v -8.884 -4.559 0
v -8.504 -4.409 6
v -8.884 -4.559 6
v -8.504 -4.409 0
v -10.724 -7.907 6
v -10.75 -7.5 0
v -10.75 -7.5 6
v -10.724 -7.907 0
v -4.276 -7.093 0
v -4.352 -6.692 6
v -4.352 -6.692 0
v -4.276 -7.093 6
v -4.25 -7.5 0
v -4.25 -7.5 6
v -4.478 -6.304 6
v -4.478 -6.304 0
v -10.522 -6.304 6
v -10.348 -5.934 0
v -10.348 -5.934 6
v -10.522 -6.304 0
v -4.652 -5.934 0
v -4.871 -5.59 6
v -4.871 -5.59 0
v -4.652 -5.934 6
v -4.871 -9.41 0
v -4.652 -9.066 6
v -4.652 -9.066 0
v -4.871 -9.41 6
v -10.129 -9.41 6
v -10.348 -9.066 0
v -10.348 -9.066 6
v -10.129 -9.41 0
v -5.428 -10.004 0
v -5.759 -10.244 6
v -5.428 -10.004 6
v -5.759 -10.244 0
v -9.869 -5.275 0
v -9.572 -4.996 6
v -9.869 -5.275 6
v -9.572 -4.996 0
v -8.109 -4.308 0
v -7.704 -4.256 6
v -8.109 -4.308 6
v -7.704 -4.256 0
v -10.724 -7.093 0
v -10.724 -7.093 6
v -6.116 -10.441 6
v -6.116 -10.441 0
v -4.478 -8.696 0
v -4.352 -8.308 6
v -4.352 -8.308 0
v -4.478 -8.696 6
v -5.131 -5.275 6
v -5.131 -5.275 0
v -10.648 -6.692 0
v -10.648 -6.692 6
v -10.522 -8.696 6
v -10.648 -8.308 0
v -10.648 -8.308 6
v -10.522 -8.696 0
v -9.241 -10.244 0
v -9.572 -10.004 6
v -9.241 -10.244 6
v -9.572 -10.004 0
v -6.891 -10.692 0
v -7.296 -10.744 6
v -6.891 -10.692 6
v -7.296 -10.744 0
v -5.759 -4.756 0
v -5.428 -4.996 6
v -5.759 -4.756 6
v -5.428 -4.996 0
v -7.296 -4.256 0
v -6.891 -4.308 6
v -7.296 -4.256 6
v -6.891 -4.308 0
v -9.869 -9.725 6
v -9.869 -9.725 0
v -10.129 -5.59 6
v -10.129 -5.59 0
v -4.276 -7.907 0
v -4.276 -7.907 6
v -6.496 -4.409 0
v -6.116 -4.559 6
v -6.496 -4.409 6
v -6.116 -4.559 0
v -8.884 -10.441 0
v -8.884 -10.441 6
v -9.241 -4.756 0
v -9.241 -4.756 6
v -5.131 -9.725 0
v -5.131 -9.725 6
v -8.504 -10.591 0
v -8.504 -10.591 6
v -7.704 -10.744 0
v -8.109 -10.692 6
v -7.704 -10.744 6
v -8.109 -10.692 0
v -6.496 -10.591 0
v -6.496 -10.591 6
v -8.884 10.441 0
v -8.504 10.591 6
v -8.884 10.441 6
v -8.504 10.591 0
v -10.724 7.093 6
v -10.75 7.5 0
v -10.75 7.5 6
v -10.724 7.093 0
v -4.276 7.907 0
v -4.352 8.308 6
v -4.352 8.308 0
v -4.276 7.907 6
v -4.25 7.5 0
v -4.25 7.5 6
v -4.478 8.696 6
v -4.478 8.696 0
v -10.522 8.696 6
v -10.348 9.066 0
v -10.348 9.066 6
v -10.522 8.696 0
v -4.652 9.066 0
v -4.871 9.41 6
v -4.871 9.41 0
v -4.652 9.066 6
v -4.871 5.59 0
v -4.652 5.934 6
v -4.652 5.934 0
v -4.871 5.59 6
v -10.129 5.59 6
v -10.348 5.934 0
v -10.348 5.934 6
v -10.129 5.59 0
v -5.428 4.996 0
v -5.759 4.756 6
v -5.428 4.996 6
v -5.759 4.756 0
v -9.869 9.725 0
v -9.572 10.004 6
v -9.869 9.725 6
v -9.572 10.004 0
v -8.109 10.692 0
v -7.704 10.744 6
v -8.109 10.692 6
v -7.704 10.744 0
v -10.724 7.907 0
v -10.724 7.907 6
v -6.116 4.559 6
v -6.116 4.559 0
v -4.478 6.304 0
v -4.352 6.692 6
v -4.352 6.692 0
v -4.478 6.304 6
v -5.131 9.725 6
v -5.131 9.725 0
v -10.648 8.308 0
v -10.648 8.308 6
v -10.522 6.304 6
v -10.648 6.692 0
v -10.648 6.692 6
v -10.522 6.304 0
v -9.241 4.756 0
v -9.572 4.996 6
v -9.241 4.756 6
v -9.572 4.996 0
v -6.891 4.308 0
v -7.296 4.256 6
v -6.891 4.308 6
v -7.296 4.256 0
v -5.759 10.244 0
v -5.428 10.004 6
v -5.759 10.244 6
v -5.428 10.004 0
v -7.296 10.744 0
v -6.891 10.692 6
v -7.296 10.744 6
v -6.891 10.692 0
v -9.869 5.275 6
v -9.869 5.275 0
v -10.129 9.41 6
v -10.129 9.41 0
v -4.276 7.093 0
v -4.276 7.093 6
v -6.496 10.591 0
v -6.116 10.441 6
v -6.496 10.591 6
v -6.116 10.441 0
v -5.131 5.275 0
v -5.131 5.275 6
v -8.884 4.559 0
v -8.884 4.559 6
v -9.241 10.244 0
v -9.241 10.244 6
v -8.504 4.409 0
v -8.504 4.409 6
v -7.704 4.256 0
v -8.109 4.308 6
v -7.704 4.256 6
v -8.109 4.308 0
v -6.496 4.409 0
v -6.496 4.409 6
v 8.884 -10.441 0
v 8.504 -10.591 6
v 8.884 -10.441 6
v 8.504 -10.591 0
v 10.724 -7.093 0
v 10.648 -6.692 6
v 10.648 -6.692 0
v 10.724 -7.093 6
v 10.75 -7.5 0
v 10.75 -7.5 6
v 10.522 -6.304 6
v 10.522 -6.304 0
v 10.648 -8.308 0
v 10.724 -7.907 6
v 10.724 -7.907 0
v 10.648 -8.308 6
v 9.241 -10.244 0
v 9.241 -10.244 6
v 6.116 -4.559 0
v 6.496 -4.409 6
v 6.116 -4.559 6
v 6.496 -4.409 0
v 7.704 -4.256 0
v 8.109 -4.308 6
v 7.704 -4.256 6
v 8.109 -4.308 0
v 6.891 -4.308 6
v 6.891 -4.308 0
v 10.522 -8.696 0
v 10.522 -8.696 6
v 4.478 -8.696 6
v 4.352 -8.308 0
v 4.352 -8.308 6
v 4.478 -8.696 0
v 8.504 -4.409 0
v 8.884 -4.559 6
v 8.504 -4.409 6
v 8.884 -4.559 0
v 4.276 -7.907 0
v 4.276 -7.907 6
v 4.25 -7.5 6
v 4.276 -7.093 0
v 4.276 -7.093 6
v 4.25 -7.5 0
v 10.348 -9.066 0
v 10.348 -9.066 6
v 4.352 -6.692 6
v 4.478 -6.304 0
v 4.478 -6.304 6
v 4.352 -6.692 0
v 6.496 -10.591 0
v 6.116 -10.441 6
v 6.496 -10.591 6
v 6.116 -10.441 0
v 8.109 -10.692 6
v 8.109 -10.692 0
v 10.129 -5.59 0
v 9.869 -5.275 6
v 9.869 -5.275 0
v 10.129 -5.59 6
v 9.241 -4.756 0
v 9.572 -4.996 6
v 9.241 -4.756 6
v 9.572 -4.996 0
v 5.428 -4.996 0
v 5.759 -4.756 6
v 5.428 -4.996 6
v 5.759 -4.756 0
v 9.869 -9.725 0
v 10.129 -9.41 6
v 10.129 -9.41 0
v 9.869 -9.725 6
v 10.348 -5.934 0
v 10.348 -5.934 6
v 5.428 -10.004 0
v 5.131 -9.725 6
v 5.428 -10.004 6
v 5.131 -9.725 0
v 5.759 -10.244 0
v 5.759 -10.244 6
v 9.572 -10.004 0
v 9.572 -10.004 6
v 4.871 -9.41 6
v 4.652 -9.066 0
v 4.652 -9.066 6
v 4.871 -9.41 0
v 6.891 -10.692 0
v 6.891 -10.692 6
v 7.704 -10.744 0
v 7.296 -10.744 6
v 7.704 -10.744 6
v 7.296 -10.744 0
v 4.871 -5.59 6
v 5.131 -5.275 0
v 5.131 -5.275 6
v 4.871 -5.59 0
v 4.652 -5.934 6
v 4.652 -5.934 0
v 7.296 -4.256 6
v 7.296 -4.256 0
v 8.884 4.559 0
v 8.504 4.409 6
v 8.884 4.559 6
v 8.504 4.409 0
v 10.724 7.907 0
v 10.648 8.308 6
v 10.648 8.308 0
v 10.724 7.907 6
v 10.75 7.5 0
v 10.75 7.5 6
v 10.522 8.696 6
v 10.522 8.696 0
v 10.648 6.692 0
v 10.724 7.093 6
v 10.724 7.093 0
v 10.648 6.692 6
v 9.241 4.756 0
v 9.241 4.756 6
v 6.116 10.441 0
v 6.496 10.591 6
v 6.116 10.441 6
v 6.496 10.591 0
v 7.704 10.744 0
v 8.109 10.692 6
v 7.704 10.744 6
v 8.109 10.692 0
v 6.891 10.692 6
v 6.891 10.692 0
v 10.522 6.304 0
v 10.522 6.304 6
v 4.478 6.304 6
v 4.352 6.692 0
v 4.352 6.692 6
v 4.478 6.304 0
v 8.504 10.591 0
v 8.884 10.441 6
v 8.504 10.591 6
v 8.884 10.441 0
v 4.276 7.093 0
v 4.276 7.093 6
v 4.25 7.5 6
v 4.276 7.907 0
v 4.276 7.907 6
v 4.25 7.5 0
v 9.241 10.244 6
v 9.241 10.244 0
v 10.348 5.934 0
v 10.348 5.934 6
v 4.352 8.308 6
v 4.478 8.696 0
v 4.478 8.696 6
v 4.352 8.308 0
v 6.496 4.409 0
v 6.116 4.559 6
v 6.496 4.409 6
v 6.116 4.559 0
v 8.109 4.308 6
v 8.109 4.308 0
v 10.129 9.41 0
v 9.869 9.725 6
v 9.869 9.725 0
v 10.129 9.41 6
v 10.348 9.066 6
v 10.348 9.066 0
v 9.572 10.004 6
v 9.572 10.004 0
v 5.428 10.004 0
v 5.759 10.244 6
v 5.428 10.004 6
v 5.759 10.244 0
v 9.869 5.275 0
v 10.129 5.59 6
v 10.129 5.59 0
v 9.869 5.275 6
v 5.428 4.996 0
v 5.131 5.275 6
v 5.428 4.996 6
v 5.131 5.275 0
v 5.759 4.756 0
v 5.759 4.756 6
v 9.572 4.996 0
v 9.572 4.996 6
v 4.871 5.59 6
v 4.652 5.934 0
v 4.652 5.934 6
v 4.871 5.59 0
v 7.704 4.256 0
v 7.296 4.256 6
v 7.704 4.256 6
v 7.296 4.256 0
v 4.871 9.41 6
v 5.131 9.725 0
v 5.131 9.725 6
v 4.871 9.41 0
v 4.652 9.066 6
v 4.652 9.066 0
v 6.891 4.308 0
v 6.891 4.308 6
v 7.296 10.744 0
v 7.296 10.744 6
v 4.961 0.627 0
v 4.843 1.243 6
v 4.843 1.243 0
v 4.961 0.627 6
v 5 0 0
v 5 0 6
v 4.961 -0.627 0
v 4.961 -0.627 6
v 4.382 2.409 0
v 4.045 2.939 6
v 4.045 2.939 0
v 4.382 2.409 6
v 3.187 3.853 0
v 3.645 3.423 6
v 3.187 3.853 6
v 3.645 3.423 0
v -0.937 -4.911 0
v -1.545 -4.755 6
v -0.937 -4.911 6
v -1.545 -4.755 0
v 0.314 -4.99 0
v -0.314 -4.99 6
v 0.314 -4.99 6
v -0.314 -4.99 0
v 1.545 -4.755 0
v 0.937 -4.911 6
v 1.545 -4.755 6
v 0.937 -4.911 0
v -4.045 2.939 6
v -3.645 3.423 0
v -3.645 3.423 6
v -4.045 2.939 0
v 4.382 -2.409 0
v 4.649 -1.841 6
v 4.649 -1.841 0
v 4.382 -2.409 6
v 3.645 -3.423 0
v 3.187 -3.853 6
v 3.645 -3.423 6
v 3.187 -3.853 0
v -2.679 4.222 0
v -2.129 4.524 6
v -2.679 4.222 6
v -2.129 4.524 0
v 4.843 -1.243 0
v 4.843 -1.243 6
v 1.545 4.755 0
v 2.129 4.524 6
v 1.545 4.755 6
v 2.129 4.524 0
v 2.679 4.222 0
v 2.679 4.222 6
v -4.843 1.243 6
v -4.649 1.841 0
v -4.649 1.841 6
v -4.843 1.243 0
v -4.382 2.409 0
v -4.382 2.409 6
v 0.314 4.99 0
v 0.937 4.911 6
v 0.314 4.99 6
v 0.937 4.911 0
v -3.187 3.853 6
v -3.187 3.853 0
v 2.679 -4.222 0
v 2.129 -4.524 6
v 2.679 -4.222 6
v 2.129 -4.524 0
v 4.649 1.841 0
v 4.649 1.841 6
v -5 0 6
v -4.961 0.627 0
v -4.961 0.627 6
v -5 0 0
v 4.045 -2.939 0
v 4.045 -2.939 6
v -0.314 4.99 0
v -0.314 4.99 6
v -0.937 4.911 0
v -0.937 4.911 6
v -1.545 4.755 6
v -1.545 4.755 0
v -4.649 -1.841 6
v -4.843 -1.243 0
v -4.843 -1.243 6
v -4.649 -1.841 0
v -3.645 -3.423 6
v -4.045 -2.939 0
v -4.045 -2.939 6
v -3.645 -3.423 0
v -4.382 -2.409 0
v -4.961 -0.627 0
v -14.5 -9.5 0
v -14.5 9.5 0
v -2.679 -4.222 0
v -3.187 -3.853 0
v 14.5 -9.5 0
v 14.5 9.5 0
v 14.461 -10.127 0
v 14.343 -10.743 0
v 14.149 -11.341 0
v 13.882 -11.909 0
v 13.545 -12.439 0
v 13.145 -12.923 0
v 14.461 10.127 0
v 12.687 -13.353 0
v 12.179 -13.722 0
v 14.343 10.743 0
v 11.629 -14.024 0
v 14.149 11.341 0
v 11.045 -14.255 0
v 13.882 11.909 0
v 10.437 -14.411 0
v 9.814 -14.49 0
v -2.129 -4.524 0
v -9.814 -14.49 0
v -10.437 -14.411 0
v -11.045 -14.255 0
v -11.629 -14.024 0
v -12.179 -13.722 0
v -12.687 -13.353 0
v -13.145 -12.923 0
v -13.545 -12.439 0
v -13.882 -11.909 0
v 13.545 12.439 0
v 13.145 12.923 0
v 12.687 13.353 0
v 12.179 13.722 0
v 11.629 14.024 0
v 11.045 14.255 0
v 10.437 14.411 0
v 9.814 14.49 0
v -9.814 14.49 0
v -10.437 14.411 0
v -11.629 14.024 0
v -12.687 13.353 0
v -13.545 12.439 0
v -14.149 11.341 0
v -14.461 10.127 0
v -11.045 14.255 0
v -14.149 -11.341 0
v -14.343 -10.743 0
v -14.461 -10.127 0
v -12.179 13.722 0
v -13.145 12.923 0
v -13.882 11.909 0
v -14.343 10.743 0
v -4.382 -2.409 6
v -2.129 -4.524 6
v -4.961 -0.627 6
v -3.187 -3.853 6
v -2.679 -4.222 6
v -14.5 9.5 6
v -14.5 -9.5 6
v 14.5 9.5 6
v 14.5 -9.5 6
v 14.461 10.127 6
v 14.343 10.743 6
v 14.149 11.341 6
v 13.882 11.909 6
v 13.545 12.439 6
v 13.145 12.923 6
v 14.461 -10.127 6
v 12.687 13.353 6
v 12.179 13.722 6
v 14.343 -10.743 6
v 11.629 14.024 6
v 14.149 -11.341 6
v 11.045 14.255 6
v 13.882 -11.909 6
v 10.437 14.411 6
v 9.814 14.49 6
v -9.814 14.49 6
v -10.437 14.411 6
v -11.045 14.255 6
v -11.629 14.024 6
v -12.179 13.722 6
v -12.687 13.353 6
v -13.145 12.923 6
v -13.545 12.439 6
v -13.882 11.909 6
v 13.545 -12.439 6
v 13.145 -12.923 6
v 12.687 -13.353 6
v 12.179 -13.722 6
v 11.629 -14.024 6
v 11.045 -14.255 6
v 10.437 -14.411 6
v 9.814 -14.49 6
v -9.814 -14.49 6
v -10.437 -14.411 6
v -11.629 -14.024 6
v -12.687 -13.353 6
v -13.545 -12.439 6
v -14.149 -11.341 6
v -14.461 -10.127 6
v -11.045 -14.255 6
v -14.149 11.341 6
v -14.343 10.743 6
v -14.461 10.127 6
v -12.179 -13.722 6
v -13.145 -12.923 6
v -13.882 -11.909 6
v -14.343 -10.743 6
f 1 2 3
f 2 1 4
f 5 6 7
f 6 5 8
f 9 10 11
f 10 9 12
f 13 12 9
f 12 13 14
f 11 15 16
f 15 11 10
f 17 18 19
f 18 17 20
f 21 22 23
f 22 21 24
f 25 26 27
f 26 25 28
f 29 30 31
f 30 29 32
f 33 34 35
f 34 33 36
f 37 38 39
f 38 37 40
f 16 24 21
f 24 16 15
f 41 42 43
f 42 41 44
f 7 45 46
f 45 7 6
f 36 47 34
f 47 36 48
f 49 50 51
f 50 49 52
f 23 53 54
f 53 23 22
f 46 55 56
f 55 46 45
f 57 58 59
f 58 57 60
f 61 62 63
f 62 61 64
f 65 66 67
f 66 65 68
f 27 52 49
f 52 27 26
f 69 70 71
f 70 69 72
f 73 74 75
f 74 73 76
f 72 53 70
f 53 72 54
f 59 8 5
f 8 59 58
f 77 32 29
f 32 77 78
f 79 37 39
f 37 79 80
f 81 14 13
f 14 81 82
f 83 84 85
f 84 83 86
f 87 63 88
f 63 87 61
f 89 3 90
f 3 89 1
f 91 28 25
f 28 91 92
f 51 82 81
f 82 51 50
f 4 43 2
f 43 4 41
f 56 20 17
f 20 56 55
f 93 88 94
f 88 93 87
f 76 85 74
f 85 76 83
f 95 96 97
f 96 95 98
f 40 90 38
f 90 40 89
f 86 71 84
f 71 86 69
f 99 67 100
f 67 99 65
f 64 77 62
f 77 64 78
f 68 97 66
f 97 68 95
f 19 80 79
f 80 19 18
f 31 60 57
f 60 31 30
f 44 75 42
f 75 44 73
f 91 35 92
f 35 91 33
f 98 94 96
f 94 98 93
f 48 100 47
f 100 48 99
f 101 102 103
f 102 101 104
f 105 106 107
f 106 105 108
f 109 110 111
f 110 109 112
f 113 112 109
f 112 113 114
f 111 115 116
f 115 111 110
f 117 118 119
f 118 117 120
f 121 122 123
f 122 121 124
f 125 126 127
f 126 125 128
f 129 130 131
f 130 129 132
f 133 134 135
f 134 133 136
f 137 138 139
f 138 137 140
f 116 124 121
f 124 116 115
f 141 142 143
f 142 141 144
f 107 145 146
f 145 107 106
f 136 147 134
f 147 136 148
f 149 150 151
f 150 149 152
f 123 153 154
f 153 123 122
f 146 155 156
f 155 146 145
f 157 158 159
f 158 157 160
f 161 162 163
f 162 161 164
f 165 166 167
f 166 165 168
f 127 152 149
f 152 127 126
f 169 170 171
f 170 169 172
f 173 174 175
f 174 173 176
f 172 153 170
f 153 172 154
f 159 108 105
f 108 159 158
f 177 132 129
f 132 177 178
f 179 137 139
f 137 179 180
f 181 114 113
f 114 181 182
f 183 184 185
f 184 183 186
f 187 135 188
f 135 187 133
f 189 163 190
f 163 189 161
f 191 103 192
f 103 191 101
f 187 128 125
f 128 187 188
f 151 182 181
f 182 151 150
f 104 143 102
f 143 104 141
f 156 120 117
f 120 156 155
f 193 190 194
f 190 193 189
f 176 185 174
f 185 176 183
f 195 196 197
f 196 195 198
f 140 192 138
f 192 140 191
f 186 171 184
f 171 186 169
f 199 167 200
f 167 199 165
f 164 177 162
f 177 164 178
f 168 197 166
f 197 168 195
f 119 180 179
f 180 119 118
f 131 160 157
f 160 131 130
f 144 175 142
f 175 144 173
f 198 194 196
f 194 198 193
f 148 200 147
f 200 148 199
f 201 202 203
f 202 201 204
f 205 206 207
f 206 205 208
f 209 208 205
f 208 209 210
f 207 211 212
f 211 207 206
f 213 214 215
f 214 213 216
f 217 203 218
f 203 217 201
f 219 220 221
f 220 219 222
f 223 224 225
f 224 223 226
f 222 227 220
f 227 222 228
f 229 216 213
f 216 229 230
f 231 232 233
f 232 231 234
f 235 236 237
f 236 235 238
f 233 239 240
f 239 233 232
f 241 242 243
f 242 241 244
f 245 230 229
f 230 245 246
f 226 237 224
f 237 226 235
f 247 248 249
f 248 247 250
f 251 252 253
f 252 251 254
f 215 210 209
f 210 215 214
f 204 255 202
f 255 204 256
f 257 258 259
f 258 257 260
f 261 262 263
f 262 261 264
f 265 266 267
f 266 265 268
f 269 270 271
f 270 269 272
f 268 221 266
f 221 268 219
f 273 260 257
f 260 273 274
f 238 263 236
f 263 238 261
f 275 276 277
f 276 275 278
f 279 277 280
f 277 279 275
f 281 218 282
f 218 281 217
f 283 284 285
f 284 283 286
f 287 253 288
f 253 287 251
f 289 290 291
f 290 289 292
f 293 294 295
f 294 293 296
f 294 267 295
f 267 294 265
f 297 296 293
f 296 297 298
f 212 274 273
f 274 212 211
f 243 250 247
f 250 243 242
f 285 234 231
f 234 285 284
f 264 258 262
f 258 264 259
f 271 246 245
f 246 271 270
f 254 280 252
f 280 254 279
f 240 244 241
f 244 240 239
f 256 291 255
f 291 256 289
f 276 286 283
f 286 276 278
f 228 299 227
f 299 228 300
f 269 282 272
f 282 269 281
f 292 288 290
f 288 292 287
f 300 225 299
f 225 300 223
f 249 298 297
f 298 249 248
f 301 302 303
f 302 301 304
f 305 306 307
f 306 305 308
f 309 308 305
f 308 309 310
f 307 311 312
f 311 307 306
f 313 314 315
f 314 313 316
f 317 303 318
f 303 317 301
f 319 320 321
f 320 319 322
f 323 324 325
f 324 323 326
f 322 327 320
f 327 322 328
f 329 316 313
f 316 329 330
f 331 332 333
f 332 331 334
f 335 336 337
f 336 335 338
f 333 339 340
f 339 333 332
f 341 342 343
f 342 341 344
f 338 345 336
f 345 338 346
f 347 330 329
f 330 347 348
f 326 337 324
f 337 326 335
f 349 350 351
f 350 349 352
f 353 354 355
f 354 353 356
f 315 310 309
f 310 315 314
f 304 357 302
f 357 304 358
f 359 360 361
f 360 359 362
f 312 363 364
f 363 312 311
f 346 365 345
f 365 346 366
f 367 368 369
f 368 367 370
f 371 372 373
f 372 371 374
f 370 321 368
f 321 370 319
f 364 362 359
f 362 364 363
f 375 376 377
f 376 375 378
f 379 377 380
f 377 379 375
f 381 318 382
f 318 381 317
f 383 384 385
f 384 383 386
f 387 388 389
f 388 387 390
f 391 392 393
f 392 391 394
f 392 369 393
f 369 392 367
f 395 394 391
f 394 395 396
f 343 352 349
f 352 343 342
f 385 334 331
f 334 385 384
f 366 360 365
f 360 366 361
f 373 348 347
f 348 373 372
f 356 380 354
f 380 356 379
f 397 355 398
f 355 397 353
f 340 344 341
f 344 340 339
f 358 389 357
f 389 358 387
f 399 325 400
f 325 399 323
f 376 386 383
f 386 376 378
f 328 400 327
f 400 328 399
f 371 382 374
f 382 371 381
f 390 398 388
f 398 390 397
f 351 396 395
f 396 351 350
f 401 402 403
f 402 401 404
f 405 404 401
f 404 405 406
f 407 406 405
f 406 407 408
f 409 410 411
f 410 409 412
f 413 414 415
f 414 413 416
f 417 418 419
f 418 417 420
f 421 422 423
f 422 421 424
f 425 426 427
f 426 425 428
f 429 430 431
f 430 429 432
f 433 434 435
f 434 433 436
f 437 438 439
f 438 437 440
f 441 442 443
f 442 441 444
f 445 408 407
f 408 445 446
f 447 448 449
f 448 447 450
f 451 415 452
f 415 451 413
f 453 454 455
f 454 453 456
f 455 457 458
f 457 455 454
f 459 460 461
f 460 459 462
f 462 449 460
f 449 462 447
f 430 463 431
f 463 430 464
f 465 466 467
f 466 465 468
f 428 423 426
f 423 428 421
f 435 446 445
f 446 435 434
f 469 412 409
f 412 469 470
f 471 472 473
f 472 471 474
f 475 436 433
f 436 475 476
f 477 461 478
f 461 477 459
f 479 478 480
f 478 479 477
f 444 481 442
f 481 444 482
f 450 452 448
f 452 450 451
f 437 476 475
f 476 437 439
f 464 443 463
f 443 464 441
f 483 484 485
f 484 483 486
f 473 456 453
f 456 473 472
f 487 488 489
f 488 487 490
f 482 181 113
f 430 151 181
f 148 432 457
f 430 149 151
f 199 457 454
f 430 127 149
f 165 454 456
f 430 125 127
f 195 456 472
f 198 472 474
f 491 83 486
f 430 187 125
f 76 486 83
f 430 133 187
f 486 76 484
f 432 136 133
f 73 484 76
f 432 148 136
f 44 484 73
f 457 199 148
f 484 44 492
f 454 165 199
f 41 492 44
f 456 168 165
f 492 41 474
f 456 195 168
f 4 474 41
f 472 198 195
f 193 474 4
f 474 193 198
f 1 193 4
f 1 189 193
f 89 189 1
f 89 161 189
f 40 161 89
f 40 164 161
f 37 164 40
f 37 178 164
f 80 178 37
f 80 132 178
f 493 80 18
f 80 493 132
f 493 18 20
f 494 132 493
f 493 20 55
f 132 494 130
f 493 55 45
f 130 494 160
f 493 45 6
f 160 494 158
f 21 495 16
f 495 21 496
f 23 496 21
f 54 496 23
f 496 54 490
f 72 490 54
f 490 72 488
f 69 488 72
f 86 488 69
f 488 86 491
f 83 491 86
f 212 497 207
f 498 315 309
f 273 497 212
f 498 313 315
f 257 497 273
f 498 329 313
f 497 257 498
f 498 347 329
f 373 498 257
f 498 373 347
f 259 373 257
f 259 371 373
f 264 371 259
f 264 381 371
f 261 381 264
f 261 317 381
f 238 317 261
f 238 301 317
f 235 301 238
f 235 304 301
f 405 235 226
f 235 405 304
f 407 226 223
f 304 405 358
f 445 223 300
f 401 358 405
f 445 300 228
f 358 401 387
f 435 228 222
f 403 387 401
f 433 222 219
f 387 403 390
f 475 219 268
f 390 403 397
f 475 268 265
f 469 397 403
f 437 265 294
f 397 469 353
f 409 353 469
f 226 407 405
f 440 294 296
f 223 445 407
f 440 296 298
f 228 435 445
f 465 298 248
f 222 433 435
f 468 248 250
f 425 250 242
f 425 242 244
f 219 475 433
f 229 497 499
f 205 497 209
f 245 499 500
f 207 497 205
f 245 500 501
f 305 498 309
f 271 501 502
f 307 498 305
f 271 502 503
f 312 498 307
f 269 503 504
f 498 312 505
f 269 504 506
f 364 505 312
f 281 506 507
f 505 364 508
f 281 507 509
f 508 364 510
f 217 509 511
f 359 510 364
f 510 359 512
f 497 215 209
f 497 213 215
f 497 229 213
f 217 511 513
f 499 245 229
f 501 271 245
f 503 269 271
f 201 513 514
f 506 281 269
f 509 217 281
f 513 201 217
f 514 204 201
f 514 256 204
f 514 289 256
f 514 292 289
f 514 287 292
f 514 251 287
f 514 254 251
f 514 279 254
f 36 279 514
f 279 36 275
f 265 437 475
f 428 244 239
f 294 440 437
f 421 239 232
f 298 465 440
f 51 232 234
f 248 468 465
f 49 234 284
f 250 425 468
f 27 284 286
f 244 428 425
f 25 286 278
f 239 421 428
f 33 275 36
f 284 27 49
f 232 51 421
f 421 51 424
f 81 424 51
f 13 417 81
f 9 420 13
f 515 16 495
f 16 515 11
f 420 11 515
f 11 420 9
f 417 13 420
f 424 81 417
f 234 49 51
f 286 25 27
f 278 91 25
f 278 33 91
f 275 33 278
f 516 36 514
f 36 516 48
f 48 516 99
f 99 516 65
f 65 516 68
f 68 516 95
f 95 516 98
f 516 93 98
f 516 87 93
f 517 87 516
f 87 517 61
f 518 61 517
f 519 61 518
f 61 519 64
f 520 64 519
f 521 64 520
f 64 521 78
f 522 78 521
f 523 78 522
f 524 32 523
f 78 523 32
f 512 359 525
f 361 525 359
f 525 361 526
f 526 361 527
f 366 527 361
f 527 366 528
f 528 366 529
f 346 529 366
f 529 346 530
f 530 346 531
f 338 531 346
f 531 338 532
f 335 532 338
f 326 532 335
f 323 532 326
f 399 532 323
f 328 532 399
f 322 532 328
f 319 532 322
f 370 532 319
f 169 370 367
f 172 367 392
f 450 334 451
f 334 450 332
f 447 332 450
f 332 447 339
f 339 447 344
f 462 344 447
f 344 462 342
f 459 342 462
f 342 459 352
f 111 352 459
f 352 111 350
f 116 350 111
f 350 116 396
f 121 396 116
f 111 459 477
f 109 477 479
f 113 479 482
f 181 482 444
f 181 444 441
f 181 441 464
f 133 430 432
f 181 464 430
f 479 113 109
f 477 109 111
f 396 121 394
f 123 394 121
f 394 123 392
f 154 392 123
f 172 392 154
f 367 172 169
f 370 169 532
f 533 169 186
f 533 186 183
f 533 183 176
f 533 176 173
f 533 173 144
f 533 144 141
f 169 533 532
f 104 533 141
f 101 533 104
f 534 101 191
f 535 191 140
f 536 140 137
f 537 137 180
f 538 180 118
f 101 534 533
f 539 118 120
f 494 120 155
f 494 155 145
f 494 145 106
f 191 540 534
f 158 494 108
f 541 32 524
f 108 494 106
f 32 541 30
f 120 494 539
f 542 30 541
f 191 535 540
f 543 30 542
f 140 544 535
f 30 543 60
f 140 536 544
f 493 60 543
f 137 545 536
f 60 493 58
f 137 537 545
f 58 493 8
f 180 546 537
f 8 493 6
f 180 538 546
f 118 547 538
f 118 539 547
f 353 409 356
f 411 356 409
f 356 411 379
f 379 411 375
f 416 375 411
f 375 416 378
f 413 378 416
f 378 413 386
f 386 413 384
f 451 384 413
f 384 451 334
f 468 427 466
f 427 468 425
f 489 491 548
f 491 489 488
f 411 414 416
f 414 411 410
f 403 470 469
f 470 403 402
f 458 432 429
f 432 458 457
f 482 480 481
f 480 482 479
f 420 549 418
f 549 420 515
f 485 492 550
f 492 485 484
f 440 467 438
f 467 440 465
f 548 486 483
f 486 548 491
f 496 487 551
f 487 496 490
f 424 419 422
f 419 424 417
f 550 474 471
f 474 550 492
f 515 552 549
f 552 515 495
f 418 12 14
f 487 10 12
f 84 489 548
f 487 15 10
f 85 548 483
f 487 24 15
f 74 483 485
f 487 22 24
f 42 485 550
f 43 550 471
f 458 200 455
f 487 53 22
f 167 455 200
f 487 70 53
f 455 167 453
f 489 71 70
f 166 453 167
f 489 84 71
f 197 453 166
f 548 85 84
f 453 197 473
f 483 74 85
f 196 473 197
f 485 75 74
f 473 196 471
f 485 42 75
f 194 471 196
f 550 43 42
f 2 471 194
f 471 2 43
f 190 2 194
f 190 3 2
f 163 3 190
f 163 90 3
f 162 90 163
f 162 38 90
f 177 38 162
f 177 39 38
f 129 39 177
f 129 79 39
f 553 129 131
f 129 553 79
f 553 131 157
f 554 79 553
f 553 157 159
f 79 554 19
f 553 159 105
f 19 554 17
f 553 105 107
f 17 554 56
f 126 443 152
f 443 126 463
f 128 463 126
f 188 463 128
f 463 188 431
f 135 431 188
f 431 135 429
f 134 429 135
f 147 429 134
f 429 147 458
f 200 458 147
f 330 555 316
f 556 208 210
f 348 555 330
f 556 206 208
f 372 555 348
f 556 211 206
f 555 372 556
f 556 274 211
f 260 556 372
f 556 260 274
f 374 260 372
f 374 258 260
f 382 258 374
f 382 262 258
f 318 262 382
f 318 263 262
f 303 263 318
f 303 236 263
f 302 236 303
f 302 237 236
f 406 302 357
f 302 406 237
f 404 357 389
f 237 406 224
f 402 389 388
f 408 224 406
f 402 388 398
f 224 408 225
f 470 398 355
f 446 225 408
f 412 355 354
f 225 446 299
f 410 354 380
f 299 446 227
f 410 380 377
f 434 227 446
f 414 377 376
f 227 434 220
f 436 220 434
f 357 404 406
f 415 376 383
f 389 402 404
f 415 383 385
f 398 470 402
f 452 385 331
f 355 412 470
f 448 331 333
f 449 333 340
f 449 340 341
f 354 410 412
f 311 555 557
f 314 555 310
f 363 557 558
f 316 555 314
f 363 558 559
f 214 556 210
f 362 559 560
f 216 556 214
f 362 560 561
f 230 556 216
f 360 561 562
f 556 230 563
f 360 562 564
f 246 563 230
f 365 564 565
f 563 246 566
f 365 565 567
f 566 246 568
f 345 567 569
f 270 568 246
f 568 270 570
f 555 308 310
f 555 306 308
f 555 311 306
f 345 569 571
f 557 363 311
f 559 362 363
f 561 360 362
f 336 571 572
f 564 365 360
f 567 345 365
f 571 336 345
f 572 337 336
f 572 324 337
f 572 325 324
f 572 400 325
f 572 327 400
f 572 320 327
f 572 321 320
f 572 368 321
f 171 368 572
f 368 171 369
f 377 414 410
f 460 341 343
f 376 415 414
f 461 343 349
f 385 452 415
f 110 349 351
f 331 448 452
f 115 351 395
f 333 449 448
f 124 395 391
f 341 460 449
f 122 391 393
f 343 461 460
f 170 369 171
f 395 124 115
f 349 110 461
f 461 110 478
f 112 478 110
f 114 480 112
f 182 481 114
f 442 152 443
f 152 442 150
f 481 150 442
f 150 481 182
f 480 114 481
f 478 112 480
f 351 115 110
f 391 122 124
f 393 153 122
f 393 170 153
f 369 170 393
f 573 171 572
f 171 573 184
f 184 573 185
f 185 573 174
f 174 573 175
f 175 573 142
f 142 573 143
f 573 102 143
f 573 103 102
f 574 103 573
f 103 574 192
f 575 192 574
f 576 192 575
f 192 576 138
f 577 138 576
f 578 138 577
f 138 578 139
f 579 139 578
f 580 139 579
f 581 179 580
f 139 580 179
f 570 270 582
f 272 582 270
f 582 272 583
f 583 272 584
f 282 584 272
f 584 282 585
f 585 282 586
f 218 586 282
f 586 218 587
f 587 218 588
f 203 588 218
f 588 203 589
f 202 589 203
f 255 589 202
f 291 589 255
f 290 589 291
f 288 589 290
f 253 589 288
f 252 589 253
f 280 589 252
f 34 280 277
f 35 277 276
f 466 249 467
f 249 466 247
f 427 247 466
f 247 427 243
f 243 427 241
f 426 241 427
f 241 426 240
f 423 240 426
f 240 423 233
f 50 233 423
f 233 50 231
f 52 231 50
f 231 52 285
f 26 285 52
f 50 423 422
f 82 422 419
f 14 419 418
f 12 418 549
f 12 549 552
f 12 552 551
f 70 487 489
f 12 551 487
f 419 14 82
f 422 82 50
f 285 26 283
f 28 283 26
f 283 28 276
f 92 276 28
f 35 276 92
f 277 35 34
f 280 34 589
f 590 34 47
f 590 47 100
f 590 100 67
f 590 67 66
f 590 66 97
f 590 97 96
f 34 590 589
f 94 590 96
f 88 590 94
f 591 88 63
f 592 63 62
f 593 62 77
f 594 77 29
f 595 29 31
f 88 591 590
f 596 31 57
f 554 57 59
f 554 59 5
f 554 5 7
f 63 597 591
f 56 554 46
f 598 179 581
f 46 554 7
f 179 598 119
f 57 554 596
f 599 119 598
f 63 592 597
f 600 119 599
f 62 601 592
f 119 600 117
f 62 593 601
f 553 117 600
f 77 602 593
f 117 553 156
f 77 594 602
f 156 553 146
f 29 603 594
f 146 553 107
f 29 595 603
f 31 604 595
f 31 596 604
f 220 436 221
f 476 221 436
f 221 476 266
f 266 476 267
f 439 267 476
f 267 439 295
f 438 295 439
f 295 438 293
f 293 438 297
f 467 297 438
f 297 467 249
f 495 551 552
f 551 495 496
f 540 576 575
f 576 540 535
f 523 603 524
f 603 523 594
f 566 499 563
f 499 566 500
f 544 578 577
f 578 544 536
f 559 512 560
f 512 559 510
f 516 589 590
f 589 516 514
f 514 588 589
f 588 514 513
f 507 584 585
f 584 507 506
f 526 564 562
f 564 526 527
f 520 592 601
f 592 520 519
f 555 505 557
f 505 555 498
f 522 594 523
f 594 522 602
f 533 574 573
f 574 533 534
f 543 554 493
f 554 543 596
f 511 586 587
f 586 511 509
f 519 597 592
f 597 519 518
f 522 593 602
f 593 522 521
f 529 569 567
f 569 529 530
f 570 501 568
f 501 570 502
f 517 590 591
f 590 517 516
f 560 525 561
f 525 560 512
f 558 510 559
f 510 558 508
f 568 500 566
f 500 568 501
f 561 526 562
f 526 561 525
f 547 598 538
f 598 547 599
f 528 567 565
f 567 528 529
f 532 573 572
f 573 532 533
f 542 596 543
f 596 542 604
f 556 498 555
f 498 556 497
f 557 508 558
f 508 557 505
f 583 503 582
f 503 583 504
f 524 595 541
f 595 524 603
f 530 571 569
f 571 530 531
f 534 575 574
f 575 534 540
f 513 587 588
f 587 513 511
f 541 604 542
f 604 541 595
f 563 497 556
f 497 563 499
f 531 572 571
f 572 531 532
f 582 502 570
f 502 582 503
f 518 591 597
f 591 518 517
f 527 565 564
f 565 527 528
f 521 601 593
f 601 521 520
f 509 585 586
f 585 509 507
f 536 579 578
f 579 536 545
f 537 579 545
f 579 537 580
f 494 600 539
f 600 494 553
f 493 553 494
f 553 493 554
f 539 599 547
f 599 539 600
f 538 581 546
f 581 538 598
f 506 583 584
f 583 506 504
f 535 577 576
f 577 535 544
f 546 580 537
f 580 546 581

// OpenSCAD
$fn = 50;

difference() {
	union() {
		hull() {
			translate(v = [-9.5, 9.5, 0]) {
				cylinder(h = 6, r = 5);
			}
			translate(v = [9.5, 9.5, 0]) {
				cylinder(h = 6, r = 5);
			}
			translate(v = [-9.5, -9.5, 0]) {
				cylinder(h = 6, r = 5);
			}
			translate(v = [9.5, -9.5, 0]) {
				cylinder(h = 6, r = 5);
			}
		}
	}
	union() {
		translate(v = [-7.5, -7.5, -100.0]) {
			cylinder(h = 200, r = 3.25);
		}
		translate(v = [-7.5, 7.5, -100.0]) {
			cylinder(h = 200, r = 3.25);
		}
		translate(v = [7.5, -7.5, -100.0]) {
			cylinder(h = 200, r = 3.25);
		}
		translate(v = [7.5, 7.5, -100.0]) {
			cylinder(h = 200, r = 3.25);
		}
		translate(v = [-7.5, -7.5, -100.0]) {
			cylinder(h = 200, r = 1.8);
		}
		translate(v = [-7.5, 7.5, -100.0]) {
			cylinder(h = 200, r = 1.8);
		}
		translate(v = [7.5, -7.5, -100.0]) {
			cylinder(h = 200, r = 1.8);
		}
		translate(v = [7.5, 7.5, -100.0]) {
			cylinder(h = 200, r = 1.8);
		}
		cylinder(h = 6, r = 5.0);
	}
}
